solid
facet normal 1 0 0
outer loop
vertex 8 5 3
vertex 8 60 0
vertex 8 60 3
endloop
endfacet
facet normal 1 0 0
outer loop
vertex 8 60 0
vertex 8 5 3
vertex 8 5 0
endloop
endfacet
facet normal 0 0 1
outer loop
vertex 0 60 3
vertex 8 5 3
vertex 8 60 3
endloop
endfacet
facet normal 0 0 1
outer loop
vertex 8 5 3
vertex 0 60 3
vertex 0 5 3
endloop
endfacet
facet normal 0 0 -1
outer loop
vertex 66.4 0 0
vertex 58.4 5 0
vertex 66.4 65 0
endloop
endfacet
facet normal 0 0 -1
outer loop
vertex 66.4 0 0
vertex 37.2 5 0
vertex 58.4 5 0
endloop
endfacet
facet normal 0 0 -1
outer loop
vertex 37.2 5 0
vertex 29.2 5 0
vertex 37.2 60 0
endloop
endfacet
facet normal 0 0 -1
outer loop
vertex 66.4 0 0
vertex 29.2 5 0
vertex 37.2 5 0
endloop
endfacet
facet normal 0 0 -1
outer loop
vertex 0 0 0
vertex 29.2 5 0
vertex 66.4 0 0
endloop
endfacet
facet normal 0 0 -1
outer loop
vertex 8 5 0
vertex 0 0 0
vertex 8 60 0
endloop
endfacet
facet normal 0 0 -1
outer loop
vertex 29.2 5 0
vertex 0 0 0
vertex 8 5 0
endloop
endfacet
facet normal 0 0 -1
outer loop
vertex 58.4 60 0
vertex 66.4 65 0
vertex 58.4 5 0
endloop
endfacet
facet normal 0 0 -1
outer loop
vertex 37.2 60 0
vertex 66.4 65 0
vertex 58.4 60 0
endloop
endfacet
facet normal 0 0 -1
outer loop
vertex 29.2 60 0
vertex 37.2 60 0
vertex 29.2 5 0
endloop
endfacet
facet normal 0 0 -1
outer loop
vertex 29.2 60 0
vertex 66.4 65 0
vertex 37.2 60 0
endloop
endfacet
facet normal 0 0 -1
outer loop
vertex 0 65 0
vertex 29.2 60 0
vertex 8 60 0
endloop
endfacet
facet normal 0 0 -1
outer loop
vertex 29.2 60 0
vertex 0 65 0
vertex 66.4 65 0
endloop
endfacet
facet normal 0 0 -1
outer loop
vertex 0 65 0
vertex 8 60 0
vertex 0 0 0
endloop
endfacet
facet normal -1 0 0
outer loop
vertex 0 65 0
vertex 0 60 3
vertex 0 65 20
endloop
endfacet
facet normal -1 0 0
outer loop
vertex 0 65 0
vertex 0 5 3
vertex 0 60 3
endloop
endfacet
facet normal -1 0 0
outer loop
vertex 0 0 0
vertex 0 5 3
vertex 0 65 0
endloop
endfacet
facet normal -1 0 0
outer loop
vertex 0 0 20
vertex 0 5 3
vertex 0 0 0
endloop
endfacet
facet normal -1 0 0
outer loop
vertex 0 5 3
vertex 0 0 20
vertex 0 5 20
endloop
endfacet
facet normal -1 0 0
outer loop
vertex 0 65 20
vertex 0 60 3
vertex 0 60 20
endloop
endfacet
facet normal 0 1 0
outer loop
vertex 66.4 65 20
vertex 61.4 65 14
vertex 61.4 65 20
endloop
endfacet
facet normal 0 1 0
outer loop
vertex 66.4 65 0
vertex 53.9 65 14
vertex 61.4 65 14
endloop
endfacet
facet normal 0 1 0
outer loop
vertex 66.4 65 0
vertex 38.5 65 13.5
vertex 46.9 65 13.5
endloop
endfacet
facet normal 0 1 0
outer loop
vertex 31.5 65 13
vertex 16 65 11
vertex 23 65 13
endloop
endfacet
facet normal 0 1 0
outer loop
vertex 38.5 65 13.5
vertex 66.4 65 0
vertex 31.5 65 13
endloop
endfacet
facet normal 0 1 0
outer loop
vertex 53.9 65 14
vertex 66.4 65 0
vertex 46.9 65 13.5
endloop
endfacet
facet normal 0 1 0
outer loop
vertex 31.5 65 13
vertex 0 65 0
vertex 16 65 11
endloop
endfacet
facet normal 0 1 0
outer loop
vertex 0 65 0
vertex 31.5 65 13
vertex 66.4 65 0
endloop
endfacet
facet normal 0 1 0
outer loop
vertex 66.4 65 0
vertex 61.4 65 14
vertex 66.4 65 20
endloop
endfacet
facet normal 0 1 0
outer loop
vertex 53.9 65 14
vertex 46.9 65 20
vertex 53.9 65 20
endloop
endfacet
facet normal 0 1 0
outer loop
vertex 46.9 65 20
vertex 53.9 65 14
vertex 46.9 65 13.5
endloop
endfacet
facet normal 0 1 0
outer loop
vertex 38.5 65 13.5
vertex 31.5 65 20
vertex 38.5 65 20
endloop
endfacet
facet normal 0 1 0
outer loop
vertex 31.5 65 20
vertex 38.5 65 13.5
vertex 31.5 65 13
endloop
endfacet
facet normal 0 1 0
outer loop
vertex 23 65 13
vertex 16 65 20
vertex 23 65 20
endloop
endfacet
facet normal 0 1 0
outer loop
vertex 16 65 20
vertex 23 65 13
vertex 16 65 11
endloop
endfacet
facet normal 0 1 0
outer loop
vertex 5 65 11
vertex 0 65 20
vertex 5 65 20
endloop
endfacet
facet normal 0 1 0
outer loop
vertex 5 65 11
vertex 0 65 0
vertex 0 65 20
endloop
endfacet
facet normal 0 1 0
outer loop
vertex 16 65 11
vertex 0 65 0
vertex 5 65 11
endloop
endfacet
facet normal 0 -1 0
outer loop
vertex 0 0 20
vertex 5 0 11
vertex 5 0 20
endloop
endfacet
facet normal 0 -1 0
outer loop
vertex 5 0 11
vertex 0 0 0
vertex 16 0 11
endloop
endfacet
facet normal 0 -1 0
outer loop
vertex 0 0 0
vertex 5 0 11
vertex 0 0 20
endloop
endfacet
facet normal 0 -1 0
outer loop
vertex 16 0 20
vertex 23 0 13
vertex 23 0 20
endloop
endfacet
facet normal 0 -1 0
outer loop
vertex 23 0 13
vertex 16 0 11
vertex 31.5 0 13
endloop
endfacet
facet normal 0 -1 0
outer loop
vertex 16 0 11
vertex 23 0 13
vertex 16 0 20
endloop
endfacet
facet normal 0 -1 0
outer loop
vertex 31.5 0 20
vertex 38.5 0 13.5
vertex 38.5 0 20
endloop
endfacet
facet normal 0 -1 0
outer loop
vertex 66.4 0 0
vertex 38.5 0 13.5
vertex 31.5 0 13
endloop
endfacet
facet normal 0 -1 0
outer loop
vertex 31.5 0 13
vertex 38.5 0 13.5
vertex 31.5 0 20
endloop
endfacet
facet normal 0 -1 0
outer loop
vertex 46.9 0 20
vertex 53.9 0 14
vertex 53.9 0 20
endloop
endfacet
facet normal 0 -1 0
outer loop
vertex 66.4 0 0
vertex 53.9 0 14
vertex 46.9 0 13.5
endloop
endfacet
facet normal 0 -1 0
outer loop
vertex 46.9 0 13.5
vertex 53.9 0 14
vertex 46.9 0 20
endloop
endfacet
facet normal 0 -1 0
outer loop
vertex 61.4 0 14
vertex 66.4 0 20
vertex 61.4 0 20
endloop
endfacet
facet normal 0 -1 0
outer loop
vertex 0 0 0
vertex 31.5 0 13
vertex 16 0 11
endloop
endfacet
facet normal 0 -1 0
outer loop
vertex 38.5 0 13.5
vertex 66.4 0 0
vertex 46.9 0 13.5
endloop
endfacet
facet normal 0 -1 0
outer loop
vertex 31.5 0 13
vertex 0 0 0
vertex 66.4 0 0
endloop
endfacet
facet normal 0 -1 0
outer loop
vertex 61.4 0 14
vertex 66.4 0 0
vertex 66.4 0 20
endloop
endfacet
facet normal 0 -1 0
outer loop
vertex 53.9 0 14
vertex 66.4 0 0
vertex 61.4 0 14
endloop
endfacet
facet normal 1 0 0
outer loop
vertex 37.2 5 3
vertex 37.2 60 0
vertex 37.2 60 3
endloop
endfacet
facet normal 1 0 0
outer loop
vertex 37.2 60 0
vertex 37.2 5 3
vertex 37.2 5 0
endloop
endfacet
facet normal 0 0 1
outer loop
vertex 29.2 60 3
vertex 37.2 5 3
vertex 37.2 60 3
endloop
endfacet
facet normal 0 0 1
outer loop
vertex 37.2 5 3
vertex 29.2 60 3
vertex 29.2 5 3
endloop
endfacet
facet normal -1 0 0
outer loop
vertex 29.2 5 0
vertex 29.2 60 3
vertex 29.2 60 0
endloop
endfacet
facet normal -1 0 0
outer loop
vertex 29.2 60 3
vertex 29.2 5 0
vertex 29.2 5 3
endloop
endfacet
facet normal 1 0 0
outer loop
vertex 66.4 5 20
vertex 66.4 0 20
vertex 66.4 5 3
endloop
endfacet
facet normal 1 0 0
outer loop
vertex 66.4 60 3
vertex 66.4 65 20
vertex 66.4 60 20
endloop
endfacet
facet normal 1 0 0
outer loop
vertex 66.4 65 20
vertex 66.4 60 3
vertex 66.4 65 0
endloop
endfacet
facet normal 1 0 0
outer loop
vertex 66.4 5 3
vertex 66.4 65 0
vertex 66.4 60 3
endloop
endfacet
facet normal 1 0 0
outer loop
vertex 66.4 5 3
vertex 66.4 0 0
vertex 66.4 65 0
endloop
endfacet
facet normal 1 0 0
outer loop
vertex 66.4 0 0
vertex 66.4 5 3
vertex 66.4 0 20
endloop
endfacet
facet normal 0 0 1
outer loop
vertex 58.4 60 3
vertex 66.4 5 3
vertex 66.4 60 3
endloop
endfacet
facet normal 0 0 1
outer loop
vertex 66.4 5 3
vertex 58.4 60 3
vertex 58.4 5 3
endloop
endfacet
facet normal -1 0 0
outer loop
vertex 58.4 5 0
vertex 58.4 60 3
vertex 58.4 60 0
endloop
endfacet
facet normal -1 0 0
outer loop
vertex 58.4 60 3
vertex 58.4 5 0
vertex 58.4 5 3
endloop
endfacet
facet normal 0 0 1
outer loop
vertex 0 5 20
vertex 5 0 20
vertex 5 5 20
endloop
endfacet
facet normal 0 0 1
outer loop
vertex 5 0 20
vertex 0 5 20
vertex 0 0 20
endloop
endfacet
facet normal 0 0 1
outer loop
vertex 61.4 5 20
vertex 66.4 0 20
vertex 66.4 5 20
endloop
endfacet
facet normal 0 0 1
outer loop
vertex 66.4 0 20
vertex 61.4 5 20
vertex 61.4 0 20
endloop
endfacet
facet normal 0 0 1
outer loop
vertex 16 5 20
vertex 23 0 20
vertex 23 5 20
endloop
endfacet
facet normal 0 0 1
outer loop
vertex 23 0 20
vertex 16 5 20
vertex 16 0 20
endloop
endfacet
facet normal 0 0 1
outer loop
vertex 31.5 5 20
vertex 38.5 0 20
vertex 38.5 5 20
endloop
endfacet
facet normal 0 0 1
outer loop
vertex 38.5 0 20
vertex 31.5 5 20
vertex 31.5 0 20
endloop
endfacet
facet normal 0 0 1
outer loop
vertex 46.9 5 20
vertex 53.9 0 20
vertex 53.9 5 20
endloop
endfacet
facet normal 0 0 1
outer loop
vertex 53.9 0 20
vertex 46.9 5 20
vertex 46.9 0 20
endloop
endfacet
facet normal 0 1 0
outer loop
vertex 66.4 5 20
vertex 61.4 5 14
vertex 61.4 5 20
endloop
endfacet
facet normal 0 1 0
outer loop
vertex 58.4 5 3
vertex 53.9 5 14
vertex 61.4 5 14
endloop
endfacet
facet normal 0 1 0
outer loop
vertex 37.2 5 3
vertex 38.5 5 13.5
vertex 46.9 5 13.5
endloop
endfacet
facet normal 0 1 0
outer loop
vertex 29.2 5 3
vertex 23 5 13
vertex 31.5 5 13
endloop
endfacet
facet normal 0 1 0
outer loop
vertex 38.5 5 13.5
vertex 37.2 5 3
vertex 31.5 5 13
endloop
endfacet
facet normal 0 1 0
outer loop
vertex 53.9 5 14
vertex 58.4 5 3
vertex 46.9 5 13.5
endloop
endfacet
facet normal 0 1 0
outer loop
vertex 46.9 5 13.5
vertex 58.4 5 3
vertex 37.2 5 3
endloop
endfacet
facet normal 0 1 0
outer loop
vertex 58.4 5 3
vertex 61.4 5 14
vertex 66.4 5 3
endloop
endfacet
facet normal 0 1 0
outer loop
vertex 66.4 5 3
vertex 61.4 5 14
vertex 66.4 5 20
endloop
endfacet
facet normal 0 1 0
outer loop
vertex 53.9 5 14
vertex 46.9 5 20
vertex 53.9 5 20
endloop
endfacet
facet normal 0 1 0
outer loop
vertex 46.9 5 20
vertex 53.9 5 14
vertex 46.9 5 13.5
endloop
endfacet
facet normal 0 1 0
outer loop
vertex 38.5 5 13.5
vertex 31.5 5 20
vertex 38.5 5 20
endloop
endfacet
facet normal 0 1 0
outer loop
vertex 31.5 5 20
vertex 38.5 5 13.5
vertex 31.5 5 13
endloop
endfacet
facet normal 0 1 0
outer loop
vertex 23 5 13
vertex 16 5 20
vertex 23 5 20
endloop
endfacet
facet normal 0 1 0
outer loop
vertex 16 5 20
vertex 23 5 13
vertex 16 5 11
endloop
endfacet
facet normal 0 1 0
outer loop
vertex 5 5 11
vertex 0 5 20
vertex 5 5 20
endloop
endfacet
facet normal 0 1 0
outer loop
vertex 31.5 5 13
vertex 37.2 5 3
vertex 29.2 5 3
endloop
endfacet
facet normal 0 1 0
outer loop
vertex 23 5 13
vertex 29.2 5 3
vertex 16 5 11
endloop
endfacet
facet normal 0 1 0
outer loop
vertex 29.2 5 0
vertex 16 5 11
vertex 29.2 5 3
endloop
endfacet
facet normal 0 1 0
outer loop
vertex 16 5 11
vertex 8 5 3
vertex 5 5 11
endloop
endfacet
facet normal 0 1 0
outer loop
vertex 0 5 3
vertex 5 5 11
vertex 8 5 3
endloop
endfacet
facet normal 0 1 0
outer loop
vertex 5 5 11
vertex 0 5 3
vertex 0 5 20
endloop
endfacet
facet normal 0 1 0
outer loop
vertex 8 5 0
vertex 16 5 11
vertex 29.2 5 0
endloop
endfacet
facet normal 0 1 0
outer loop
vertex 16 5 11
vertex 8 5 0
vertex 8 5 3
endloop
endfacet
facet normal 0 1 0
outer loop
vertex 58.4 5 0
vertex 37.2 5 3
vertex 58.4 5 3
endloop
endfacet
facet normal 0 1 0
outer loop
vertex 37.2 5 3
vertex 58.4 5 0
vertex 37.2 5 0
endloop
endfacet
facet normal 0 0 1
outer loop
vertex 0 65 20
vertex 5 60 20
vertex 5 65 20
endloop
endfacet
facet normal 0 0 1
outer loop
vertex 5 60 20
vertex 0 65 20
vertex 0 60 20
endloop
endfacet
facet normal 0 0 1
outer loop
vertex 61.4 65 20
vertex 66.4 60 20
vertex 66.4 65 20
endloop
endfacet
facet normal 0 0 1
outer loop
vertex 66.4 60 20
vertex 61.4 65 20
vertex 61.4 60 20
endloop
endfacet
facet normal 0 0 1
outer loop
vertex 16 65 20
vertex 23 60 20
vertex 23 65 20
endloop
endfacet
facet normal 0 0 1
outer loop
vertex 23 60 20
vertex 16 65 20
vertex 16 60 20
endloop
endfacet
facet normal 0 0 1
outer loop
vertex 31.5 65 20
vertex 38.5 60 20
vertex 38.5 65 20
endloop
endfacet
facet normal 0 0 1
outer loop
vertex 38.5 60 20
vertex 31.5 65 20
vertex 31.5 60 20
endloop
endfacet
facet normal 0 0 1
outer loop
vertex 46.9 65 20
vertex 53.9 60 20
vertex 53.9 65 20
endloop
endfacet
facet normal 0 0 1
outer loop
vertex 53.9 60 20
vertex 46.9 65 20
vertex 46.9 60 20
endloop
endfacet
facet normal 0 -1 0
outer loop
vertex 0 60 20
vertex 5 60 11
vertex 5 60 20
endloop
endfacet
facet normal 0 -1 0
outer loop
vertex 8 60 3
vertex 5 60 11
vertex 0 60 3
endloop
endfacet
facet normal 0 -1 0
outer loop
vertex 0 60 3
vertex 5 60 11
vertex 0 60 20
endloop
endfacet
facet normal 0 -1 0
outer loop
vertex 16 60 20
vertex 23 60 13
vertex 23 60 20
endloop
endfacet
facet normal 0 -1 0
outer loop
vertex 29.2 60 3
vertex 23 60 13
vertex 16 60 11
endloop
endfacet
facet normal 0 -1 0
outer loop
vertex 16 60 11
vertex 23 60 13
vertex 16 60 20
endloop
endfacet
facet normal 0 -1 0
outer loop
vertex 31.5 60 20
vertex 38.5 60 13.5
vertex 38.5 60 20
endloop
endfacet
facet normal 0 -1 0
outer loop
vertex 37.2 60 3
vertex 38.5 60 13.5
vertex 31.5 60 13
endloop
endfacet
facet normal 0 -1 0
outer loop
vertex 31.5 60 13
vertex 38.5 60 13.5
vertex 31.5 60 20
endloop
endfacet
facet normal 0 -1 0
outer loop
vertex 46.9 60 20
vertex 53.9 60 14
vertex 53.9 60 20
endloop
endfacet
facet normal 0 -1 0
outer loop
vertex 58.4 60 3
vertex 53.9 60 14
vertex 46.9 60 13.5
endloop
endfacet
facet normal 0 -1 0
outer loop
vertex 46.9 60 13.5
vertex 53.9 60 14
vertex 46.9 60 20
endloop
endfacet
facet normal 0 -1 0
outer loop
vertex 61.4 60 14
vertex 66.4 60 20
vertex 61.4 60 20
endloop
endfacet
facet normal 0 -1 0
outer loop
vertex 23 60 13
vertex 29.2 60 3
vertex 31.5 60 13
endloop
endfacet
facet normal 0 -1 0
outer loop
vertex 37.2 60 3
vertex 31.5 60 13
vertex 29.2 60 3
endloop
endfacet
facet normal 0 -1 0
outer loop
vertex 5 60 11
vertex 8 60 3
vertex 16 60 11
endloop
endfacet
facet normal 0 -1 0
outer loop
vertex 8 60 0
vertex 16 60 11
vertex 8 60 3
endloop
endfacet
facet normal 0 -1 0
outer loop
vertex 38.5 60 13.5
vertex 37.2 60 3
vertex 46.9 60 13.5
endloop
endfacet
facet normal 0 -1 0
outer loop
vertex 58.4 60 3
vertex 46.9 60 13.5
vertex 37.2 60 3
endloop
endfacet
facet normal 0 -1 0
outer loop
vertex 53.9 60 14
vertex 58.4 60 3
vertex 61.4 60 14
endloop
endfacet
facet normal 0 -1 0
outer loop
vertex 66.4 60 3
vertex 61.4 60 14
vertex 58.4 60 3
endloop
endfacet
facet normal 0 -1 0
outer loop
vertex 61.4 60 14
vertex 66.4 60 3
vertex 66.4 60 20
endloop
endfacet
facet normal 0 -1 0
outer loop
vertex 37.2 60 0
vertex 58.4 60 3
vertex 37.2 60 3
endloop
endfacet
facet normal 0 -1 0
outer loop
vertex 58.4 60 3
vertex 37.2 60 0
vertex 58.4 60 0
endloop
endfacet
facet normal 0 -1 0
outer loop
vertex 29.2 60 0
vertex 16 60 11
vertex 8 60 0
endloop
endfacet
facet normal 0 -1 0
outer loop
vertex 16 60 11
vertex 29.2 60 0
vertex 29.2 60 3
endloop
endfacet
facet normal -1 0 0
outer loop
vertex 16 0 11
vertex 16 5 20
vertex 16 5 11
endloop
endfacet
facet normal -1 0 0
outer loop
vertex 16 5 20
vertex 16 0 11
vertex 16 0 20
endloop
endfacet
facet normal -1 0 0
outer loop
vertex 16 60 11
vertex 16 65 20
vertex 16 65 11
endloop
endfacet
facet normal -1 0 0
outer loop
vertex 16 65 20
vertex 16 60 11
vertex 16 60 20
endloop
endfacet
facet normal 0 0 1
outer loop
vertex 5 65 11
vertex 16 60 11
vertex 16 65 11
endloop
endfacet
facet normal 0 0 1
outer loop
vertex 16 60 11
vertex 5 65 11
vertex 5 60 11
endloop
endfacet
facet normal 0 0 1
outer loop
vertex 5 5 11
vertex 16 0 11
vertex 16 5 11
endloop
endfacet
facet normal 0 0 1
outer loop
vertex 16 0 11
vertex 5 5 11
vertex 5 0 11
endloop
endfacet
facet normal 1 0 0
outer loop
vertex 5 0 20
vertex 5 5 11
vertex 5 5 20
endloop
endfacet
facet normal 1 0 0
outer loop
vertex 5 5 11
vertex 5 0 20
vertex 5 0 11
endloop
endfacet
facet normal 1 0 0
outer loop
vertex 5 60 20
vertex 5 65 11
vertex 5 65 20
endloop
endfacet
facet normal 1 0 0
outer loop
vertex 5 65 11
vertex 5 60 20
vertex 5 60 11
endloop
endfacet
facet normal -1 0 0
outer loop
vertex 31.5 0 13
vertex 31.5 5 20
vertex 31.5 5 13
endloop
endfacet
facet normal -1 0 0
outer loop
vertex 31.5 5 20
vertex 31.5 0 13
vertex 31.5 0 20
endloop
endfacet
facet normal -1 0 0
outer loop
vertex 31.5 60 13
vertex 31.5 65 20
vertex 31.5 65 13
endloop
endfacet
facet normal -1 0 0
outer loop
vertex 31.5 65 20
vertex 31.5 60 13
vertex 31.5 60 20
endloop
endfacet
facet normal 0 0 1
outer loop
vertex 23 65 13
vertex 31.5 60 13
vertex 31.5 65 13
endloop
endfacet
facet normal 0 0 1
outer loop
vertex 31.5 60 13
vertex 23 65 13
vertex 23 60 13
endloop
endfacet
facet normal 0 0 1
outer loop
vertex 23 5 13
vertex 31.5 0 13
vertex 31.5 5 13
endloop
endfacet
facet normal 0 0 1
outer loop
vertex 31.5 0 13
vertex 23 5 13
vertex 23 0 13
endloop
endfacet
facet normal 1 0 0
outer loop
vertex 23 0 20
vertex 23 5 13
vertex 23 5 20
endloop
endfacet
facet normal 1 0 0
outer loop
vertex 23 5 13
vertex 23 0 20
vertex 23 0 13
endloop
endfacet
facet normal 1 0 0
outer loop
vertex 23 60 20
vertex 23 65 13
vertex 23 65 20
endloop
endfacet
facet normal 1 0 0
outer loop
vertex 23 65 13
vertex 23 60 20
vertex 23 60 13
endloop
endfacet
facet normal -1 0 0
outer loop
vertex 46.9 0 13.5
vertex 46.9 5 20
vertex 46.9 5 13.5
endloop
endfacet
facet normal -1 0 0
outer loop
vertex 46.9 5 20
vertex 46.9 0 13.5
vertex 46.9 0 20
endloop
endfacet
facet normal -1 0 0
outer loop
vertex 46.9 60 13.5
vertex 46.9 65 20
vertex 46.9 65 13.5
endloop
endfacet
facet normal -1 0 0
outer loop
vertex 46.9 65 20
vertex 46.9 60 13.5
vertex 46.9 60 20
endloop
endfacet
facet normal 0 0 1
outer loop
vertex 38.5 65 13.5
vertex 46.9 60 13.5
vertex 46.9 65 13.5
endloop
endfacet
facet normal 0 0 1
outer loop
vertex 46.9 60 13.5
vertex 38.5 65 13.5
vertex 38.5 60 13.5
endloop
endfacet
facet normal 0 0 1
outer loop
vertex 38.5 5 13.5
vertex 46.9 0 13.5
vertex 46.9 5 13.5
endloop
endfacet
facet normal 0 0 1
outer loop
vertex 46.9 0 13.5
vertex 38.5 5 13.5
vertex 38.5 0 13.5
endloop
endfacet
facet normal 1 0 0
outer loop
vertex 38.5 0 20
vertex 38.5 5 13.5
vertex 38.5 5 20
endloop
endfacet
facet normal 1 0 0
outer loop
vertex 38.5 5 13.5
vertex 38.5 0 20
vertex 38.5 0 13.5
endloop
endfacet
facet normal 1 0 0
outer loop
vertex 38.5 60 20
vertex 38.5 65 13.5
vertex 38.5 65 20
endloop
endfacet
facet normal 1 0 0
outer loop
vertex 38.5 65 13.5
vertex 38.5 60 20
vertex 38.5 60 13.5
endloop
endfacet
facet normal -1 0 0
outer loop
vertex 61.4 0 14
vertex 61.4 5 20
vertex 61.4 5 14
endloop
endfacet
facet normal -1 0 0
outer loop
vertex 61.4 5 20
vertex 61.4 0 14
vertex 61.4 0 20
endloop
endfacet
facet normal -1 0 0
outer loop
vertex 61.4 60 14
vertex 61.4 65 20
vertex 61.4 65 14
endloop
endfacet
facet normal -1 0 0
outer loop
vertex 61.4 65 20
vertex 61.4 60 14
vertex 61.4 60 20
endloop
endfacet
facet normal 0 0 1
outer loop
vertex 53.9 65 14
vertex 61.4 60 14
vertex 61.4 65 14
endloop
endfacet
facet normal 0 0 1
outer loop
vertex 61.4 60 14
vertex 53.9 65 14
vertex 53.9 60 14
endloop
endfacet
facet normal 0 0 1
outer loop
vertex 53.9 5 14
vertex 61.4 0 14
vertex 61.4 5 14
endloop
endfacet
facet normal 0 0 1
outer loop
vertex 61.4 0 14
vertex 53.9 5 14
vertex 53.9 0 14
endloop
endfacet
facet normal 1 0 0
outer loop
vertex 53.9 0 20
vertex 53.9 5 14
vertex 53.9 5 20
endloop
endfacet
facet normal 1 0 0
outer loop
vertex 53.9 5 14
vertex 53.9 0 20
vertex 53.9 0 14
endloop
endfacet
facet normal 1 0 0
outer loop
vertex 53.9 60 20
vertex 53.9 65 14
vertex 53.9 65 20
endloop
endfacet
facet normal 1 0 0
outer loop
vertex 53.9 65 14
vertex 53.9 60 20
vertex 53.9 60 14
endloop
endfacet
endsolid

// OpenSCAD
widths        = [ 11,  8.50,  8.40,  7.50];
spacing       = [  7,     7,     7,     5];
pocket_depth  = [  9,     7,   6.5,     6];

base_width  = 65.0;
rail_width  =  5.0;
rail_height = 20.0;
cross_bars  =  3;
bar_width   =  8.0;

function sum (v, i = 0, r = 0) = i < len (v) ? sum (v, i + 1, r + v [i]) : r;
function subarray (list, begin = 0, end = -1) = [
  let (end = end < 0 ? len (list) : end)
    for (i = [begin : 1 : end - 1])
      list [i]
];

length = sum (widths) + sum (spacing) + 5;

difference () {
  union () {
    for (i = [0 : cross_bars - 1])
      translate ([i == 0 ? 0 : ((length / (cross_bars - 1)) * i) - (i == (cross_bars - 1) ? bar_width : (bar_width / 2)), 0, 0])
        cube ([bar_width, base_width, 3]);
    translate ([0, 0, 0])
      cube ([length, rail_width, rail_height]);
    translate ([0, base_width - rail_width, 0])
      cube ([length, rail_width, rail_height]);
  }

  for (i = [0 : len (widths) - 1]) {
    translate ([5 + sum (subarray (spacing, 0, i)) + sum (subarray (widths, 0, i)), -0.01, rail_height - pocket_depth [i]])
      cube ([widths [i], base_width + 0.02, 25]);
  }
}
